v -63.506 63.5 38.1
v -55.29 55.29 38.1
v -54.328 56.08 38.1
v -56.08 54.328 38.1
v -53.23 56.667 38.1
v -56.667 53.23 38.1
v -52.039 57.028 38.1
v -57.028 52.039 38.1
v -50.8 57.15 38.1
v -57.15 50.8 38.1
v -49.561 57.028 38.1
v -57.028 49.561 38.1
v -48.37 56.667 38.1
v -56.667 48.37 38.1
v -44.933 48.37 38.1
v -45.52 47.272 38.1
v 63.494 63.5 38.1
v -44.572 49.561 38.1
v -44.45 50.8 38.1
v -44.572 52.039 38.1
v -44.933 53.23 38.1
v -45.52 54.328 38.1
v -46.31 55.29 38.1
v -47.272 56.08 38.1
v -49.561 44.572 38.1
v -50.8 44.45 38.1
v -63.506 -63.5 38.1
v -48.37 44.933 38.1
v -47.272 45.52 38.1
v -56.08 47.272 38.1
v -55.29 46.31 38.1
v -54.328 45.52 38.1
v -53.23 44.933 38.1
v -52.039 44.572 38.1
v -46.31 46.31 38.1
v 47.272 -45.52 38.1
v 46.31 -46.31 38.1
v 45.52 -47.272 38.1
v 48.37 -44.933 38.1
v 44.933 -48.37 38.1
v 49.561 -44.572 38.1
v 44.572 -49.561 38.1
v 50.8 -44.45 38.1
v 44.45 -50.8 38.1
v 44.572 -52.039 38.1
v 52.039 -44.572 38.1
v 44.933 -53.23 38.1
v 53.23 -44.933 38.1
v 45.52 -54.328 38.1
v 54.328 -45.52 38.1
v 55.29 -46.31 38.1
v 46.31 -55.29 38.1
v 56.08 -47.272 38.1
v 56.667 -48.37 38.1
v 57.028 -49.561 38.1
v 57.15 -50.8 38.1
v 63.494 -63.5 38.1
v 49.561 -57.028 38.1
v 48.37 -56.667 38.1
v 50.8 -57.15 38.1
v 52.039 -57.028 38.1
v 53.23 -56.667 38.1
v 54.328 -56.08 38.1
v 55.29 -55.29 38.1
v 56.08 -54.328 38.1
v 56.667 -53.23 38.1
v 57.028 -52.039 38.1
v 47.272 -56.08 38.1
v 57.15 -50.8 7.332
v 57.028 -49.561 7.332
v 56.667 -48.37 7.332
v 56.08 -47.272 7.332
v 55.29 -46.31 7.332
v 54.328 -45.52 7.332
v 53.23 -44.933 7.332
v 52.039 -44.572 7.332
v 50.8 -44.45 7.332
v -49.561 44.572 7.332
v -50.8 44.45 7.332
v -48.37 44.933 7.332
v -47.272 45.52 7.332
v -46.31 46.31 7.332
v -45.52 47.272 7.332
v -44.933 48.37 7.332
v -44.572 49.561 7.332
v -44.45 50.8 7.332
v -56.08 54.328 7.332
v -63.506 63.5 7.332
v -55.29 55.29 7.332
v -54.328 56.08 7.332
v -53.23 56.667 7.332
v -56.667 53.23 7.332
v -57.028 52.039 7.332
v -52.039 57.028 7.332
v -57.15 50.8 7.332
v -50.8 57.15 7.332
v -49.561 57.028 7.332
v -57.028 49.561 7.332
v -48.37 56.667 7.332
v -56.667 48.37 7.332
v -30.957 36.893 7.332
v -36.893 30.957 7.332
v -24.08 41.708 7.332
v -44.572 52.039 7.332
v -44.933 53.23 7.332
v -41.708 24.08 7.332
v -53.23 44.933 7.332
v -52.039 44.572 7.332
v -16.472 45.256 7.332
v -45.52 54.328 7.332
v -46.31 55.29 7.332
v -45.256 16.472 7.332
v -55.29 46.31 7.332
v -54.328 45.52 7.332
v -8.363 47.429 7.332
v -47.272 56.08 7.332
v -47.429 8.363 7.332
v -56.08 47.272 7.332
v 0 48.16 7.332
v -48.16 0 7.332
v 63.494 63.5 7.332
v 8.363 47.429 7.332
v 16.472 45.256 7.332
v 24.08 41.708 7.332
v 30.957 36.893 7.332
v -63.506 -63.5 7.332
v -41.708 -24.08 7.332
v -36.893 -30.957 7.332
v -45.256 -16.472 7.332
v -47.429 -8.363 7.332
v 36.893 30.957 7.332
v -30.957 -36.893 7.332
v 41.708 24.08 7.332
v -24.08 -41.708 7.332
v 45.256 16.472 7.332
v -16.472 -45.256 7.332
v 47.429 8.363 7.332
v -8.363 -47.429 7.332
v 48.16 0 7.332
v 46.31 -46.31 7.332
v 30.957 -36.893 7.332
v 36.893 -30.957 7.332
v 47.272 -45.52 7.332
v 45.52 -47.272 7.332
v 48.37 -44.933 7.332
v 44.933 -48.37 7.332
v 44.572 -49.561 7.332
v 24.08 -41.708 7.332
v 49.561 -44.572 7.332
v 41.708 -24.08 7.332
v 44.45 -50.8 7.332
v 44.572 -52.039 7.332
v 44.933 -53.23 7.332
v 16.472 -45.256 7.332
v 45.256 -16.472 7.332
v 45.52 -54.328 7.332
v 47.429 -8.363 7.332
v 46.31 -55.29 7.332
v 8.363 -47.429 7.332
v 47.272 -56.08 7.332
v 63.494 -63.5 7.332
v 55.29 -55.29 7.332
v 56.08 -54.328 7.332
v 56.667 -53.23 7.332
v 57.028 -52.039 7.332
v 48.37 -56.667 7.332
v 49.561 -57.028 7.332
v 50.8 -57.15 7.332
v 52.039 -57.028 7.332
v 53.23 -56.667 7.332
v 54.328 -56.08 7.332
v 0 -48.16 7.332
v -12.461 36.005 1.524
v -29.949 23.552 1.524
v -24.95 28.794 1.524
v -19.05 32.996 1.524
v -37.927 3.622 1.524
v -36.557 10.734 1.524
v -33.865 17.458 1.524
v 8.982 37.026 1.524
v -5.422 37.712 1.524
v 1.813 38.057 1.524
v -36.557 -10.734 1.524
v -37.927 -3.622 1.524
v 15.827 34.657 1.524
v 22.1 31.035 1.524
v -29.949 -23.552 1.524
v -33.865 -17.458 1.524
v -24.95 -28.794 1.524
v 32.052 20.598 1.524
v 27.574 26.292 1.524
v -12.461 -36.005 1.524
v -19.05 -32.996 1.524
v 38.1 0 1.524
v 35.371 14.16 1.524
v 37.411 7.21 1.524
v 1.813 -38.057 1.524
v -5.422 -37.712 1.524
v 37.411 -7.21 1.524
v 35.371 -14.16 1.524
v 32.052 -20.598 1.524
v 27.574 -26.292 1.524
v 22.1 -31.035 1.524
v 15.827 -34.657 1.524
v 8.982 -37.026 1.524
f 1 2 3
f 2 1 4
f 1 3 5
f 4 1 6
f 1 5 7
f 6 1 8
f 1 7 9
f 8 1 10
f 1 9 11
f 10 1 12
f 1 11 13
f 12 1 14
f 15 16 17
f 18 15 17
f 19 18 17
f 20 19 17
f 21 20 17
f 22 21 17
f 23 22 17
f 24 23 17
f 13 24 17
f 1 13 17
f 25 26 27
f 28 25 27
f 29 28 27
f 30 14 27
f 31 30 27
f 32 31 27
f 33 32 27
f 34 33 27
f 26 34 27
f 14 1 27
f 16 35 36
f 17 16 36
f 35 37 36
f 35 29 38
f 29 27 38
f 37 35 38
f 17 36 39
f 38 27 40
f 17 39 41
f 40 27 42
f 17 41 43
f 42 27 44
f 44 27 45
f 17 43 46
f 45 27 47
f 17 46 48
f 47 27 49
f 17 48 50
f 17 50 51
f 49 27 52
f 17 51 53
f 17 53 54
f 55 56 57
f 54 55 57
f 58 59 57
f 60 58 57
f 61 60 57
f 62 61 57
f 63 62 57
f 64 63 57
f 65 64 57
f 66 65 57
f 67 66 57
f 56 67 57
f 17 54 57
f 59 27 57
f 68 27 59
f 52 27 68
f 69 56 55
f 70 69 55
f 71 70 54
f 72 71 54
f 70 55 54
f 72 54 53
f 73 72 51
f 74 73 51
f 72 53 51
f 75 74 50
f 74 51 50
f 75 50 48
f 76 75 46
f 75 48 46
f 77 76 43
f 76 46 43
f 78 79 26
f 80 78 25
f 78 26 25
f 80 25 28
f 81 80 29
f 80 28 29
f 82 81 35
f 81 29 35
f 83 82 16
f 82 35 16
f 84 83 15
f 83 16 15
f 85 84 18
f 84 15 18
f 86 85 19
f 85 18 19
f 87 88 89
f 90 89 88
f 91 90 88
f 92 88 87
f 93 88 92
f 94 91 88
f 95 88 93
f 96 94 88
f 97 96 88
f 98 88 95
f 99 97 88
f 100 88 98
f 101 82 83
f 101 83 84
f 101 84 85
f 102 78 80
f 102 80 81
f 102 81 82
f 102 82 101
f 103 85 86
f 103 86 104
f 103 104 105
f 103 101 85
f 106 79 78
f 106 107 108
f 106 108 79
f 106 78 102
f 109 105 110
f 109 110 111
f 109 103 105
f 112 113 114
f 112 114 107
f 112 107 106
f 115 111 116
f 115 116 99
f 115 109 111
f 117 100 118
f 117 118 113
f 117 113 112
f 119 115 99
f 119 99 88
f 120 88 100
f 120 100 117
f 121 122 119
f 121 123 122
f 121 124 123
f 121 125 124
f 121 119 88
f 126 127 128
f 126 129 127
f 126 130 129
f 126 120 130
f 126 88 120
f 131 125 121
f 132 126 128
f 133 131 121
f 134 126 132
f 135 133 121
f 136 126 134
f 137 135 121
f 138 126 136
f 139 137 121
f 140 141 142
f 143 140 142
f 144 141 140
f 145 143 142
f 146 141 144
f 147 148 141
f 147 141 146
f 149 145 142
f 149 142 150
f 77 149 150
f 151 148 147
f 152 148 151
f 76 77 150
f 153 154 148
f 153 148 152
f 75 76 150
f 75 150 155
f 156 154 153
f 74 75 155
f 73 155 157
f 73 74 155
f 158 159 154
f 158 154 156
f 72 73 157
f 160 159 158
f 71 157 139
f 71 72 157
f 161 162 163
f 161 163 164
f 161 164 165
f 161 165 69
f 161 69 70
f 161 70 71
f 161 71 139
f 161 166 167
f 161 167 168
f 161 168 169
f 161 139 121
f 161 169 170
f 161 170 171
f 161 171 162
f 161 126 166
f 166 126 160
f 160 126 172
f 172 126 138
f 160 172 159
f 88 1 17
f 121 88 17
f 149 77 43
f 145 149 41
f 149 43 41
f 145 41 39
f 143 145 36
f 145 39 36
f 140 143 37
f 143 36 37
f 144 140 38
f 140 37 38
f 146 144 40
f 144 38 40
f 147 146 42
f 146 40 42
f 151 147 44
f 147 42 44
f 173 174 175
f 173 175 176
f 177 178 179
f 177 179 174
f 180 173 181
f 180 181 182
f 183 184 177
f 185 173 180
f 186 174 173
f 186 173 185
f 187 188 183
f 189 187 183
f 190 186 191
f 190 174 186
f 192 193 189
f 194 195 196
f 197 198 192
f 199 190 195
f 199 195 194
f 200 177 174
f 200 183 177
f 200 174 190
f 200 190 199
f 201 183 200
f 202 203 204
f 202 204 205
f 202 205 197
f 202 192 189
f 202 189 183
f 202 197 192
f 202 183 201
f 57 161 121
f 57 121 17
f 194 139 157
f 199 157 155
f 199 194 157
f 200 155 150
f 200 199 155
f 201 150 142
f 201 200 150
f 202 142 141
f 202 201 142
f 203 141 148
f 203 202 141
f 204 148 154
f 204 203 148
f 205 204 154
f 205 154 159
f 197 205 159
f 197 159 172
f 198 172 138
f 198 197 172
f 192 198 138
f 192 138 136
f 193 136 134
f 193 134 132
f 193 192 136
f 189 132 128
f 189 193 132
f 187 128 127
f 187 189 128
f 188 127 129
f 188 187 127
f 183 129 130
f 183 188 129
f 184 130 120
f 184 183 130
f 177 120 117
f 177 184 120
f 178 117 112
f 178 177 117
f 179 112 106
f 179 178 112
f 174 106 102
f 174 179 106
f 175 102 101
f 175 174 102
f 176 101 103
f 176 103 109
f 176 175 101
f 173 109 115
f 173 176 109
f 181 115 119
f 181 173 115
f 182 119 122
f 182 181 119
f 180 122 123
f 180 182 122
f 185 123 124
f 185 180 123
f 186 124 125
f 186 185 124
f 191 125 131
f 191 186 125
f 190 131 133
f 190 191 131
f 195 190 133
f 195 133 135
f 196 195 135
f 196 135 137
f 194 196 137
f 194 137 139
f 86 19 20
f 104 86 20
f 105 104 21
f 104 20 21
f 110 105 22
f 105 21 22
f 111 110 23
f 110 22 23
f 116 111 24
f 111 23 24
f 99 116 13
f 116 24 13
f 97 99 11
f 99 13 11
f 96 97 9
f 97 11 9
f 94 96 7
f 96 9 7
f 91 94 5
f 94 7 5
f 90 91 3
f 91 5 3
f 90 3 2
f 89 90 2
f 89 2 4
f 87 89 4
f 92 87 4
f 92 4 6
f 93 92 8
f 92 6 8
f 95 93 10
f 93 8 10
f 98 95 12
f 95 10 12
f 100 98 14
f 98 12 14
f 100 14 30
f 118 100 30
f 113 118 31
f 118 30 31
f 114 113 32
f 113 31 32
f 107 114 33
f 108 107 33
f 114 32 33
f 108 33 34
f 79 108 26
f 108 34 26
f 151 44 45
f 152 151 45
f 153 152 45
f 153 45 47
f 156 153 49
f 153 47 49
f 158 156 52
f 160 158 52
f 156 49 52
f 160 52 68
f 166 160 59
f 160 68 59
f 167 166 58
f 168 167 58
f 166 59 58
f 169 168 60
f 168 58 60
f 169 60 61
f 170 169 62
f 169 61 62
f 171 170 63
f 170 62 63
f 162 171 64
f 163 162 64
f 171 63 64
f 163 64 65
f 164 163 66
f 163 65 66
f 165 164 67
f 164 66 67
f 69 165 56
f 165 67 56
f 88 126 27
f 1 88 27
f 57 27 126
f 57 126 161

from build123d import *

# Parameters (mm, degrees)
F1_W     = 127
F1_H     = 38.1
F2_DEPTH = 63.5
F5_DEPTH = 50.8
F7_DEPTH = 50.8


with BuildPart() as f2:
    # F1 (on Front) → F2 (new body, symmetric)
    with BuildSketch(Plane.XZ):
        with Locations((-0.005746, 19.05)):
            Rectangle(F1_W, F1_H)
    extrude(amount=F2_DEPTH, both=True)

    # F0 (on Front) → F3 (revolve, cut)
    with BuildSketch(Plane.XZ):
        Polygon((48.160355, 7.332348), (38.1, 1.524), (0, 1.524), (0, 0), (92.567263, 0), (92.567263, 7.332348), align=None)
    revolve(axis=Axis((0, 0, 0.762), (0, 0, -1)), mode=Mode.SUBTRACT)

    # F4 (on Top) → F5 (cut, symmetric)
    with BuildSketch(Plane.XY):
        with BuildLine():
            Line((-50.8, 44.45), (-50.8, 50.8))
            Line((-50.8, 50.8), (-44.45, 50.8))
            ThreePointArc((-44.45, 50.8), (-55.290128, 55.290128), (-50.8, 44.45))
        make_face()
        with BuildLine():
            Line((-44.45, 50.8), (-50.8, 50.8))
            Line((-50.8, 50.8), (-50.8, 44.45))
            ThreePointArc((-50.8, 44.45), (-46.309872, 46.309872), (-44.45, 50.8))
        make_face()
    extrude(amount=F5_DEPTH, both=True, mode=Mode.SUBTRACT)

    # F6 (on Top) → F7 (cut, symmetric)
    with BuildSketch(Plane.XY):
        with BuildLine():
            ThreePointArc((50.8, -44.45), (46.309872, -46.309872), (44.45, -50.8))
            Line((44.45, -50.8), (50.8, -50.8))
            Line((50.8, -50.8), (50.8, -44.45))
        make_face()
        with BuildLine():
            Line((50.8, -50.8), (44.45, -50.8))
            ThreePointArc((44.45, -50.8), (50.8, -57.15), (57.15, -50.8))
            ThreePointArc((57.15, -50.8), (55.290128, -46.309872), (50.8, -44.45))
            Line((50.8, -44.45), (50.8, -50.8))
        make_face()
    extrude(amount=F7_DEPTH, both=True, mode=Mode.SUBTRACT)


solid = f2.part
